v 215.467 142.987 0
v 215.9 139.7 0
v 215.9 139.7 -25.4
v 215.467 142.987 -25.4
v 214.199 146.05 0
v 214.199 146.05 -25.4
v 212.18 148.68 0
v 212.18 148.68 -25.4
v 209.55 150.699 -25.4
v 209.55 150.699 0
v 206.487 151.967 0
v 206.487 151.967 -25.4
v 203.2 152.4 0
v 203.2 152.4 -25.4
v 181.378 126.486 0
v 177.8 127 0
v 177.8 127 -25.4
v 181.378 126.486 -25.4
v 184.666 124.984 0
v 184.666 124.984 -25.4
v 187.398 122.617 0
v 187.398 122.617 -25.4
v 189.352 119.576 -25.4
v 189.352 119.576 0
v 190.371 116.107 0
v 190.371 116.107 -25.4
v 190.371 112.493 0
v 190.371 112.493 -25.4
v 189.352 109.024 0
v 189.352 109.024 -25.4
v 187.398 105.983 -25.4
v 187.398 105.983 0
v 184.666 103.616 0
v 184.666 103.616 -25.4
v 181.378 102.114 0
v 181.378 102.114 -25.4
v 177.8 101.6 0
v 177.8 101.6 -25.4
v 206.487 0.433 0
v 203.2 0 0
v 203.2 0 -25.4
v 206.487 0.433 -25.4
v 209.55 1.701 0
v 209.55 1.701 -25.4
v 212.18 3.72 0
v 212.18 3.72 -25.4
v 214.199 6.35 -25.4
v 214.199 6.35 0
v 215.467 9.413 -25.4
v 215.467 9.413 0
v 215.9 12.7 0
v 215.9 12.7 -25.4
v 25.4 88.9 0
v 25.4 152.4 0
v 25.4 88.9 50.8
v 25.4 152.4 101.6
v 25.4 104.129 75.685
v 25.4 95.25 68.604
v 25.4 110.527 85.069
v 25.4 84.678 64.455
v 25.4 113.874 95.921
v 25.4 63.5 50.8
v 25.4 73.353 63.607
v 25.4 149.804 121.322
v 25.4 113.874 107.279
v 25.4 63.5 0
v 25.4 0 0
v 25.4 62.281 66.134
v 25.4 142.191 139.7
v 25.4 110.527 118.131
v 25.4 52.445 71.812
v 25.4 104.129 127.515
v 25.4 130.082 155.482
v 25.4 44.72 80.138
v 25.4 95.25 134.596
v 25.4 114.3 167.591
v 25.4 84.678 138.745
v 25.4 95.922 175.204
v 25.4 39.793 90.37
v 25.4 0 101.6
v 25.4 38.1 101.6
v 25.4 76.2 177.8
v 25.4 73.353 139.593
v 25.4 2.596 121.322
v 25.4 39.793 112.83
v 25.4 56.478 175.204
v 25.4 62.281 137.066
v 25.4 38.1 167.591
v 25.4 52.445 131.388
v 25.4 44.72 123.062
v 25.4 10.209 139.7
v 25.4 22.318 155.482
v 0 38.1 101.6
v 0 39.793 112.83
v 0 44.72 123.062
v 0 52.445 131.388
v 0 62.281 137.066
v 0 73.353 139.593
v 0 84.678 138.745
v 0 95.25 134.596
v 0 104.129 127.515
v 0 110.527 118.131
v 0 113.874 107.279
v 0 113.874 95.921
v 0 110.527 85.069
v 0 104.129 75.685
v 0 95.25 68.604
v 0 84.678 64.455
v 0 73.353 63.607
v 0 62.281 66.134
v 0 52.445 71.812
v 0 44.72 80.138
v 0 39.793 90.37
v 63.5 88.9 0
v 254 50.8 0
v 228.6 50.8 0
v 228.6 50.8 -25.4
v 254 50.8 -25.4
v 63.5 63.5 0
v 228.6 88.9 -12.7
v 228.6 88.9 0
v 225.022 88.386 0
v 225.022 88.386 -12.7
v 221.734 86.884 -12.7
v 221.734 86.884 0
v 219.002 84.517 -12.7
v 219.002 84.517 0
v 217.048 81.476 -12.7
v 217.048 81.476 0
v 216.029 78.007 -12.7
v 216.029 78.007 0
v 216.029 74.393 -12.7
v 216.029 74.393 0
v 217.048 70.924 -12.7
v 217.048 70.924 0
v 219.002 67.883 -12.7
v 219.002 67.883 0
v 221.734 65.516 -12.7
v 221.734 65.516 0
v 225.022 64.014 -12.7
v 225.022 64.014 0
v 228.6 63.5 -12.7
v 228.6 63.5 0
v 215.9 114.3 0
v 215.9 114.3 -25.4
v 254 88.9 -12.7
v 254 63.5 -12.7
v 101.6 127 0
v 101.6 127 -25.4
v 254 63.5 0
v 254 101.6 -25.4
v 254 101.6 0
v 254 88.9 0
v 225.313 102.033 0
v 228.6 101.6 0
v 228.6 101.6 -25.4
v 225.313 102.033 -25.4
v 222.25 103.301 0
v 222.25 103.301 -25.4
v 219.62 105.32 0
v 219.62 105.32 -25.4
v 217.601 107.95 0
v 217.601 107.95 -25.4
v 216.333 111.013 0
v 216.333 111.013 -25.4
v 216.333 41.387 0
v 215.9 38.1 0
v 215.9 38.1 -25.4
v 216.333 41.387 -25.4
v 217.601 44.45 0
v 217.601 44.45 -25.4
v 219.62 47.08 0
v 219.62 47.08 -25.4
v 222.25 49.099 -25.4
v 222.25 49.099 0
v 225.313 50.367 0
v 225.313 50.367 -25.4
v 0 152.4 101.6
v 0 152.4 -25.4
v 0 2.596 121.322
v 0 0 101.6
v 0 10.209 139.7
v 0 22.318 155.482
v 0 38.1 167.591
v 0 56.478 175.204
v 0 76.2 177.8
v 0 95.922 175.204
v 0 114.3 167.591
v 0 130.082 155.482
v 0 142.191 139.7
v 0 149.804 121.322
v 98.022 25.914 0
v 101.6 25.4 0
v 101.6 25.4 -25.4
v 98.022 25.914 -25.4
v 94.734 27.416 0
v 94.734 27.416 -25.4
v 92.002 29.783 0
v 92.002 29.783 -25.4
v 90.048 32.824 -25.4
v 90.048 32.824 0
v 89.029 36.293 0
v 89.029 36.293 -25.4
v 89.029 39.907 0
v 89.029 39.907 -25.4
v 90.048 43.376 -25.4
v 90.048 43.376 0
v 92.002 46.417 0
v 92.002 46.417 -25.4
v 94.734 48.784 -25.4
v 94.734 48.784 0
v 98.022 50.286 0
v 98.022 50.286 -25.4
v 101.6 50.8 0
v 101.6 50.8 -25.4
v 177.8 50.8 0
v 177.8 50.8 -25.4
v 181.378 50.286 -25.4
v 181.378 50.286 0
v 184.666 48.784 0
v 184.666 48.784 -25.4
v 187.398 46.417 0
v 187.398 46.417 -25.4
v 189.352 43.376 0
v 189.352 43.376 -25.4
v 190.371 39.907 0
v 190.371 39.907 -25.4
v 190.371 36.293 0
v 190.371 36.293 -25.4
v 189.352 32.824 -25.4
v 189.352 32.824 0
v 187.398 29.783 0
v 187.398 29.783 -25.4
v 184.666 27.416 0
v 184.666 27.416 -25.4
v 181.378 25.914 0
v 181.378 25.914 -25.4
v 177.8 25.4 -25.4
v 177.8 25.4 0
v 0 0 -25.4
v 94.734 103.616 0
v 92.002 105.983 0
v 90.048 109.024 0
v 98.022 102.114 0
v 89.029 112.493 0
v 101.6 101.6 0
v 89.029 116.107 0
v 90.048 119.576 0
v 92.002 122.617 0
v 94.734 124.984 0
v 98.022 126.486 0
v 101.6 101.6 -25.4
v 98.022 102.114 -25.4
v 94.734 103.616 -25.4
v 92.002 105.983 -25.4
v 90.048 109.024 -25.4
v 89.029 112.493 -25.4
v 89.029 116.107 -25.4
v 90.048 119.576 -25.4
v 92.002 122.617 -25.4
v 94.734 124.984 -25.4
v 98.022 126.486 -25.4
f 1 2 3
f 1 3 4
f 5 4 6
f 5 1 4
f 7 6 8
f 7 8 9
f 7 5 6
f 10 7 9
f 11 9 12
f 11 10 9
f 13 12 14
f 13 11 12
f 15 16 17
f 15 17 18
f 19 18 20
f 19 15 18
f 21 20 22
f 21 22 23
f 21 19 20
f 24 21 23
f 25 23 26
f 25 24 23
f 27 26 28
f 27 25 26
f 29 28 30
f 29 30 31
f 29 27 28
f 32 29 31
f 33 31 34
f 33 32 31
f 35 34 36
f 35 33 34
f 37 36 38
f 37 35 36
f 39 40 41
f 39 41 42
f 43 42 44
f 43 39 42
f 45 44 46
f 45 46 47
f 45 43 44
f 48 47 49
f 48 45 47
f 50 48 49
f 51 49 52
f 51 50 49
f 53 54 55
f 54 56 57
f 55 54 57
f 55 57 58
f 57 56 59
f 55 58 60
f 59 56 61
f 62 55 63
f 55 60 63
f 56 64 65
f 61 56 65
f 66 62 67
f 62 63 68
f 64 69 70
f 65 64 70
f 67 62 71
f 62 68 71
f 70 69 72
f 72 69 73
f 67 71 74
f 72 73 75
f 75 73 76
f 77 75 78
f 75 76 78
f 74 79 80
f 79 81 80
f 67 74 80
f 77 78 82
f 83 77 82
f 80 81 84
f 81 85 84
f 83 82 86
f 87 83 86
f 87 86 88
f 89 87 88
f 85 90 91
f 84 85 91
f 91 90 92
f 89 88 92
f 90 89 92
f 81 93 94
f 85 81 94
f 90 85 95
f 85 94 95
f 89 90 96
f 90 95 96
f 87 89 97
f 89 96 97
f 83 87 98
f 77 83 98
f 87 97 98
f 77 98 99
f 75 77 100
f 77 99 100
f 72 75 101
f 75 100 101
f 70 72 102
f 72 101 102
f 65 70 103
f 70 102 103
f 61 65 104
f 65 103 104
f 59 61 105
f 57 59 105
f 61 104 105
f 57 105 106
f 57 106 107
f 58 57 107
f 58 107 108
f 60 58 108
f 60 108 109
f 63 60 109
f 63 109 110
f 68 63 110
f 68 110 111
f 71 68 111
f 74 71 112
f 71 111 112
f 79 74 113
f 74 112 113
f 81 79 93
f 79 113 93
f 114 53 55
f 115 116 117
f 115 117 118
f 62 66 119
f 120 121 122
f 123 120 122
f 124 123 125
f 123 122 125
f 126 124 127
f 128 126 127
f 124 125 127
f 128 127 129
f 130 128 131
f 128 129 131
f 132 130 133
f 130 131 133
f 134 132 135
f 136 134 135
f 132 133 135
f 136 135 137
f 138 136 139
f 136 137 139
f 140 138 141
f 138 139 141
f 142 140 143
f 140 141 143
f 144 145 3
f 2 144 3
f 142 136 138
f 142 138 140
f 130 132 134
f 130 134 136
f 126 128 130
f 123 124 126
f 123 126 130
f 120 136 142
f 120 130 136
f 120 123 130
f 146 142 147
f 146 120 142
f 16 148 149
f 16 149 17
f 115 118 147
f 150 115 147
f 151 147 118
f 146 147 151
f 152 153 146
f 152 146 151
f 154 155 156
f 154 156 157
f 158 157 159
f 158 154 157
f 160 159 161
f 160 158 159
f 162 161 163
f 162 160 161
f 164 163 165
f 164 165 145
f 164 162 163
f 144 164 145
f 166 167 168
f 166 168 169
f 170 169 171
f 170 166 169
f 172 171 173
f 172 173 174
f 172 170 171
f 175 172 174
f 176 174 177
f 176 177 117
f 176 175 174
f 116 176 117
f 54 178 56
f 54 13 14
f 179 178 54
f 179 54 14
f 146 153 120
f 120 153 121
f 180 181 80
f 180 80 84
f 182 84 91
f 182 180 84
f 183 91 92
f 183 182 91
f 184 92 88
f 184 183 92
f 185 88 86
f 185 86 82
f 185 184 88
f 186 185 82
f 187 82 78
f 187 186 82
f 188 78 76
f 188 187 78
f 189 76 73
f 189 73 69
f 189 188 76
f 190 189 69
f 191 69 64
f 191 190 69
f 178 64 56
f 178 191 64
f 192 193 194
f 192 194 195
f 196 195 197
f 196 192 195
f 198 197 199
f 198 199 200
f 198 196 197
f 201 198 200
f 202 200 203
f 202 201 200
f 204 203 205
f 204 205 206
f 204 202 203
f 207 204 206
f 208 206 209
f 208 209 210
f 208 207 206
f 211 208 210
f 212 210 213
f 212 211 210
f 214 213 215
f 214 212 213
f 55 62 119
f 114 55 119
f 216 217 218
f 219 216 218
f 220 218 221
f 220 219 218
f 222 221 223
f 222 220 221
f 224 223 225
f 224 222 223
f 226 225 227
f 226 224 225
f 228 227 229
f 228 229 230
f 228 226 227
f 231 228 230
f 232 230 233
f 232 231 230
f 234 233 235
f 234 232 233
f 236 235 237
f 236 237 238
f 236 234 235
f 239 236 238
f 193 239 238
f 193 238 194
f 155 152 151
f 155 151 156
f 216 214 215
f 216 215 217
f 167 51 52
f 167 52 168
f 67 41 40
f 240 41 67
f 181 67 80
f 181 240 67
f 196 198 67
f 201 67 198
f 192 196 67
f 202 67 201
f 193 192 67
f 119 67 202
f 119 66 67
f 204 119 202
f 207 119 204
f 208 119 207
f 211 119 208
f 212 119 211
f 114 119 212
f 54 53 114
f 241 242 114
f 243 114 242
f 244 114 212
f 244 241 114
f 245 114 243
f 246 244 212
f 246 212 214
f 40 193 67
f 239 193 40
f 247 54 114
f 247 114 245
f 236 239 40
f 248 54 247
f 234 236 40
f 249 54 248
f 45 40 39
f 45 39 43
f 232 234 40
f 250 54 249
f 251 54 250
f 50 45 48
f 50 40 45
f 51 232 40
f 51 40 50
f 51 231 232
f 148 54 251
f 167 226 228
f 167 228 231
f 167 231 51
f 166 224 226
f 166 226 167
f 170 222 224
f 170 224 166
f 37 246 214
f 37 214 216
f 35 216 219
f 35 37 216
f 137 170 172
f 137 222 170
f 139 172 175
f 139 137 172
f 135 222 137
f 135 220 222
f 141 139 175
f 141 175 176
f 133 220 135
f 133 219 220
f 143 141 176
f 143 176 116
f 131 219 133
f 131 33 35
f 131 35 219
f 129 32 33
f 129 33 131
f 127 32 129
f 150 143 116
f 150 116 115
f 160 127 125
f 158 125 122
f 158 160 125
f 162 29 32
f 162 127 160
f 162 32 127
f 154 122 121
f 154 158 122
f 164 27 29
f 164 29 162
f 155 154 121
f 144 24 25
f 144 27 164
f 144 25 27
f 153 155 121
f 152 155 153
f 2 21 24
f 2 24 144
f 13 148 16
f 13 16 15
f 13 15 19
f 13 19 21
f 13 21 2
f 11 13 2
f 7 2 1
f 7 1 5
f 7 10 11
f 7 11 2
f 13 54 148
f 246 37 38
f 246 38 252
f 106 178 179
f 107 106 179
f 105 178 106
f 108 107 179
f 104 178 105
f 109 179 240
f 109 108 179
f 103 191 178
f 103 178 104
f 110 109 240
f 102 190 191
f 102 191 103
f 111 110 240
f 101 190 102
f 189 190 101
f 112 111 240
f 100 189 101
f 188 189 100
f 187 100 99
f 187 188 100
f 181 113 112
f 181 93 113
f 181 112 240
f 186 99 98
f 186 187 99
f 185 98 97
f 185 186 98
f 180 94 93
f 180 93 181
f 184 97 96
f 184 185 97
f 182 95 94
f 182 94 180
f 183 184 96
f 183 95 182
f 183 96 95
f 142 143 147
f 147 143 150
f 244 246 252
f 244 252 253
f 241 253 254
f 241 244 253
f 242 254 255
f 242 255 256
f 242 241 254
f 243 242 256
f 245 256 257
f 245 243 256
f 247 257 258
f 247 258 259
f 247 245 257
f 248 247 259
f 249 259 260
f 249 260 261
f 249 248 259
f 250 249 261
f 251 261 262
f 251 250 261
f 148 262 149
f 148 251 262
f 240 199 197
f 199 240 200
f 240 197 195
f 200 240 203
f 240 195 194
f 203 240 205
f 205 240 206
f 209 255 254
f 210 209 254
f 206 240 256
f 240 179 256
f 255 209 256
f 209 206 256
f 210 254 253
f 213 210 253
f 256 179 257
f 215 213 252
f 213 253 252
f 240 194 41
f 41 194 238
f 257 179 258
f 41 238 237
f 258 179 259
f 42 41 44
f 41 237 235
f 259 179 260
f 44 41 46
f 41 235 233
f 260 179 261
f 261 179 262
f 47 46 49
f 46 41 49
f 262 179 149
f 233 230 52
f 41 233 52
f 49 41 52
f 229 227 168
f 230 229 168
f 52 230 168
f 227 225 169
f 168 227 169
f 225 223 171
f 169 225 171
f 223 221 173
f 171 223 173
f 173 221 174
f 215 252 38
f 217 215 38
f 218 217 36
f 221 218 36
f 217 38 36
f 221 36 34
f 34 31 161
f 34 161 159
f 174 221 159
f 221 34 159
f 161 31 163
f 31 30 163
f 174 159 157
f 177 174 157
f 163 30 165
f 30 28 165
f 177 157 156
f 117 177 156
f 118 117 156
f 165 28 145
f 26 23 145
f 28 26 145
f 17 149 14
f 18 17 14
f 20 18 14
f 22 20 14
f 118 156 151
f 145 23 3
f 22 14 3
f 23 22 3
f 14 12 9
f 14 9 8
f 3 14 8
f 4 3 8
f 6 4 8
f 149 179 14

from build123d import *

# Parameters (mm, degrees)
F0_W     = 38.1
F0_H     = 25.4
F1_DEPTH = 25.4
F2_R     = 38.1
F3_DEPTH = 25.4
F4_DEPTH = 12.7
F5_DEPTH = 50.8
F7_DEPTH = 25.4


with BuildPart() as f1:
    # F0 (on Top) → F1 (new body)
    with BuildSketch(Plane.XY):
        with BuildLine():
            Line((0, 152.4), (0, 0))
            Line((0, 0), (203.2, 0))
            ThreePointArc((203.2, 0), (212.180256, 3.719744), (215.9, 12.7))
            Line((215.9, 12.7), (215.9, 38.1))
            ThreePointArc((215.9, 38.1), (219.619744, 47.080256), (228.6, 50.8))
            Line((228.6, 50.8), (254, 50.8))
            Line((254, 50.8), (254, 63.5))
            Line((254, 63.5), (228.6, 63.5))
            ThreePointArc((228.6, 63.5), (215.9, 76.2), (228.6, 88.9))
            Line((228.6, 88.9), (254, 88.9))
            Line((254, 88.9), (254, 101.6))
            Line((254, 101.6), (228.6, 101.6))
            ThreePointArc((228.6, 101.6), (219.619744, 105.319744), (215.9, 114.3))
            Line((215.9, 114.3), (215.9, 139.7))
            ThreePointArc((215.9, 139.7), (212.180256, 148.680256), (203.2, 152.4))
            Line((203.2, 152.4), (0, 152.4))
        make_face()
        with BuildLine():
            ThreePointArc((177.8, 50.8), (190.5, 38.1), (177.8, 25.4))
            Line((177.8, 25.4), (101.6, 25.4))
            ThreePointArc((101.6, 25.4), (88.9, 38.1), (101.6, 50.8))
            Line((101.6, 50.8), (177.8, 50.8))
        make_face(mode=Mode.SUBTRACT)
        with Locations((44.45, 76.2)):
            Rectangle(F0_W, F0_H, mode=Mode.SUBTRACT)
        with BuildLine():
            ThreePointArc((177.8, 127), (190.5, 114.3), (177.8, 101.6))
            Line((177.8, 101.6), (101.6, 101.6))
            ThreePointArc((101.6, 101.6), (88.9, 114.3), (101.6, 127))
            Line((101.6, 127), (177.8, 127))
        make_face(mode=Mode.SUBTRACT)
        with BuildLine():
            Line((228.6, 63.5), (254, 63.5))
            Line((254, 63.5), (254, 88.9))
            Line((254, 88.9), (228.6, 88.9))
            ThreePointArc((228.6, 88.9), (215.9, 76.2), (228.6, 63.5))
        make_face()
        with Locations((44.45, 76.2)):
            Rectangle(F0_W, F0_H)
    extrude(amount=-F1_DEPTH)

    # F2 (on face) → F3 (join)
    with BuildSketch(Plane(origin=(0, 0, 0), x_dir=(0, -1, 0), z_dir=(-1, 0, 0))):
        with BuildLine():
            Line((-152.4, 101.6), (-152.4, 0))
            Line((-152.4, 0), (0, 0))
            Line((0, 0), (0, 101.6))
            ThreePointArc((0, 101.6), (-76.2, 177.8), (-152.4, 101.6))
        make_face()
        with Locations((-76.2, 101.6)):
            Circle(F2_R, mode=Mode.SUBTRACT)
    extrude(amount=-F3_DEPTH)

    # F0 (on Top) → F4 (cut)
    with BuildSketch(Plane.XY):
        with BuildLine():
            Line((228.6, 63.5), (254, 63.5))
            Line((254, 63.5), (254, 88.9))
            Line((254, 88.9), (228.6, 88.9))
            ThreePointArc((228.6, 88.9), (215.9, 76.2), (228.6, 63.5))
        make_face()
    extrude(amount=-F4_DEPTH, mode=Mode.SUBTRACT)

    # F0 (on Top) → F5 (join)
    with BuildSketch(Plane.XY):
        with Locations((44.45, 76.2)):
            Rectangle(F0_W, F0_H)
    extrude(amount=F5_DEPTH)

    # F6 (on face) → F7 (cut)
    with BuildSketch(Plane.XZ.offset(-63.5)):
        Polygon((25.4, 50.8), (63.5, 0), (63.5, 50.8), align=None)
    extrude(amount=-F7_DEPTH, mode=Mode.SUBTRACT)


solid = f1.part
